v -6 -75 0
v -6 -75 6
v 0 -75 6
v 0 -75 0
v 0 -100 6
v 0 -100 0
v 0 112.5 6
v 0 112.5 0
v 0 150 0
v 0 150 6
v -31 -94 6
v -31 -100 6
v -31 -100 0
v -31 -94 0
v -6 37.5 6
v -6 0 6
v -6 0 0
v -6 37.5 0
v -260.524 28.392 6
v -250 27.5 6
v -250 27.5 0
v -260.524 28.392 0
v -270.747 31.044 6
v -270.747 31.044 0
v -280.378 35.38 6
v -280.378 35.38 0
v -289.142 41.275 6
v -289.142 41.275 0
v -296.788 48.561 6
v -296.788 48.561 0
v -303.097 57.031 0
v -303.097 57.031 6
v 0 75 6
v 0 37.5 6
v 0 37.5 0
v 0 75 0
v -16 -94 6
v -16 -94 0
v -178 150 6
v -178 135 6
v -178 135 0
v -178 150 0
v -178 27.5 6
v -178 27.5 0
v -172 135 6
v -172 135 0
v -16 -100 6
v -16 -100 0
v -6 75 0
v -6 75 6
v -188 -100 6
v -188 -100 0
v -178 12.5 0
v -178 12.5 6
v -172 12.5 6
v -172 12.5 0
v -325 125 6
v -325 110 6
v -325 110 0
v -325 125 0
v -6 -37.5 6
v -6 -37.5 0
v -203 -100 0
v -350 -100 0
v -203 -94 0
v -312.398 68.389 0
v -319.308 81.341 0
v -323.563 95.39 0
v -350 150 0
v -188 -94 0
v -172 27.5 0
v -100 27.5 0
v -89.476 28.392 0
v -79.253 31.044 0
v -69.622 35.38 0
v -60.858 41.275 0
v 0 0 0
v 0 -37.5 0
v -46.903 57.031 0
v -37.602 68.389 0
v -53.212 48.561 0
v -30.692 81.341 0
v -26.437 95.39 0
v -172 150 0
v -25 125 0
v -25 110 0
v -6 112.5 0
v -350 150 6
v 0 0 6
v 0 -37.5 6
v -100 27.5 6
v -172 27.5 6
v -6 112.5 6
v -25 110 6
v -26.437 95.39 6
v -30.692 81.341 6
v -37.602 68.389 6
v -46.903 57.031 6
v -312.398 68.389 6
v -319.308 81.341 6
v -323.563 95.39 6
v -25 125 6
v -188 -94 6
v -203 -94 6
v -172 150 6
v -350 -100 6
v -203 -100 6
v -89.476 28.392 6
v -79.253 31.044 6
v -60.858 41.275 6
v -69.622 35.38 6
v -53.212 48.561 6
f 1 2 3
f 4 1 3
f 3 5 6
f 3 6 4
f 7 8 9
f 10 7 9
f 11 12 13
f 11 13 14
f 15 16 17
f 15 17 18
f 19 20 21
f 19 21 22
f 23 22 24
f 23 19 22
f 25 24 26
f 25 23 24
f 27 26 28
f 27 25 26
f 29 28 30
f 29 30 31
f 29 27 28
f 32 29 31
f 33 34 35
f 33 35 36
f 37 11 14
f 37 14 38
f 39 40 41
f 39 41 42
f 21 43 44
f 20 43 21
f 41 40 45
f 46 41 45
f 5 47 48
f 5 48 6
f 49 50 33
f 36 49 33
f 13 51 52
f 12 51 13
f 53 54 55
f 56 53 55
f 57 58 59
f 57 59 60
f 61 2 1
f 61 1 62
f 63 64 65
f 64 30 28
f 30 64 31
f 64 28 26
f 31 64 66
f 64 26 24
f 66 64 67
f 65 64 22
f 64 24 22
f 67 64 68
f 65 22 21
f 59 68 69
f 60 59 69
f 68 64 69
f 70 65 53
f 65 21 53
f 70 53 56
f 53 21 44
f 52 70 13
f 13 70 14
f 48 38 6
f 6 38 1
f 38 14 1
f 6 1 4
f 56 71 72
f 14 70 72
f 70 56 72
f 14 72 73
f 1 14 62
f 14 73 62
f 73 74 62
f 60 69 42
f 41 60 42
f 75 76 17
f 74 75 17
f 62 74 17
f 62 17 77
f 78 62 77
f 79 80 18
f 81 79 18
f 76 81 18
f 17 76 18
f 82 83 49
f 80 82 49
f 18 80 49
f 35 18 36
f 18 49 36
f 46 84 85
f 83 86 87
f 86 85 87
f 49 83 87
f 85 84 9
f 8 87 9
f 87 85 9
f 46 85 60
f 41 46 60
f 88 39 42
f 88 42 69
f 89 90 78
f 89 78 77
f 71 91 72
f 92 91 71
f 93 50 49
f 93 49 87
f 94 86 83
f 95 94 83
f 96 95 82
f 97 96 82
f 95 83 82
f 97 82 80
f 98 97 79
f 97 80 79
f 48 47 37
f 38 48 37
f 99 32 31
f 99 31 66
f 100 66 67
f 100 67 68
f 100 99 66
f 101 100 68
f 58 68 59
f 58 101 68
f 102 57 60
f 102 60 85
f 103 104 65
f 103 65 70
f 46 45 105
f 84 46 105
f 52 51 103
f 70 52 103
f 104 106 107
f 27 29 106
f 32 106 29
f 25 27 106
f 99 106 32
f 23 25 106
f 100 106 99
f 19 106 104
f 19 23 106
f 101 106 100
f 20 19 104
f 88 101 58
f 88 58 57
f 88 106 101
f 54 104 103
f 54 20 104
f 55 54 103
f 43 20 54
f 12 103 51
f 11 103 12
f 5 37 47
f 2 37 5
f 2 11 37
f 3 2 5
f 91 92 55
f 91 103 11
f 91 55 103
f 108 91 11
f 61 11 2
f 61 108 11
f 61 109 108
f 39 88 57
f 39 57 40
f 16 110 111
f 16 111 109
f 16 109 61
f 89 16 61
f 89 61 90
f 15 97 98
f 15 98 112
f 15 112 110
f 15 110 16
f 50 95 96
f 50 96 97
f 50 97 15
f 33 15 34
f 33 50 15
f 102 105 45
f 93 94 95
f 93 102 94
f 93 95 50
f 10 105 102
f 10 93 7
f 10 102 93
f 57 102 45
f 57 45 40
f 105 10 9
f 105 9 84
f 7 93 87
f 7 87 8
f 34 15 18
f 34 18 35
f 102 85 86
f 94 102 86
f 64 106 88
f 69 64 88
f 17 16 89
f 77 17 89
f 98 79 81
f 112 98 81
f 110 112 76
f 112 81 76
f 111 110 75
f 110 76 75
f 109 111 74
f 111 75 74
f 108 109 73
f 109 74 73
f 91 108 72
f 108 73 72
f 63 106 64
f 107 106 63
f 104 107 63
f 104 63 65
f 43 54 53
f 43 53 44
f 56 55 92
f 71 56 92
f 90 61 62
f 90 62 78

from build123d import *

# Parameters (mm, degrees)
SKETCH1_W           = 200
SKETCH1_H           = 150
BOSS_EXTRUDE1_DEPTH = 6
SKETCH3_W           = 100
SKETCH3_H           = 97.5
CUT_EXTRUDE1_DEPTH  = 6
BOSS_EXTRUDE3_DEPTH = 6
SKETCH5_W           = 6
SKETCH5_H           = 15
CUT_EXTRUDE2_DEPTH  = 6
SKETCH6_W           = 6
SKETCH6_H           = 37.5
CUT_EXTRUDE3_DEPTH  = 6
SKETCH8_W           = 350
SKETCH8_H           = 100
BOSS_EXTRUDE4_DEPTH = 6
LPATTERN1_COUNT     = 3
LPATTERN1_PITCH     = 75
SKETCH7_W           = 15
SKETCH7_H           = 6
CUT_EXTRUDE_S_DEPTH = 381.835922675


with BuildPart() as part:
    # Sketch1 → Boss-Extrude1 (new body)
    with BuildSketch(Plane.XY):
        with Locations((-100, 75)):
            Rectangle(SKETCH1_W, SKETCH1_H)
        with BuildLine():
            Line((-175, 110), (-175, 125))
            Line((-175, 125), (-25, 125))
            Line((-25, 125), (-25, 110))
            ThreePointArc((-25, 110), (-30.691670032, 81.340701386), (-46.902810588, 57.03125))
            ThreePointArc((-46.902810588, 57.03125), (-100, 27.5), (-153.097189412, 57.03125))
            ThreePointArc((-153.097189412, 57.03125), (-169.308329968, 81.340701386), (-175, 110))
        make_face(mode=Mode.SUBTRACT)
    extrude(amount=BOSS_EXTRUDE1_DEPTH)

    # Sketch3 → Cut-Extrude1 (cut)
    with BuildSketch(Plane.XY.offset(6)):
        with Locations((-150, 76.25)):
            Rectangle(SKETCH3_W, SKETCH3_H)
    extrude(amount=-CUT_EXTRUDE1_DEPTH, mode=Mode.SUBTRACT)

    # Sketch4 → Boss-Extrude3 (add)
    with BuildSketch(Plane.XY.offset(6)):
        with BuildLine():
            Line((-200, 27.5), (-250, 27.5))
            ThreePointArc((-250, 27.5), (-280.378472024, 35.379505335), (-303.097189412, 57.03125))
            ThreePointArc((-303.097189412, 57.03125), (-319.308329968, 81.340701386), (-325, 110))
            Line((-325, 110), (-325, 125))
            Line((-325, 125), (-200, 125))
            Line((-200, 125), (-200, 150))
            Line((-200, 150), (-350, 150))
            Line((-350, 150), (-350, 0))
            Line((-350, 0), (-200, 0))
            Line((-200, 0), (-200, 27.5))
        make_face()
    extrude(amount=-BOSS_EXTRUDE3_DEPTH)

    # Sketch5 → Cut-Extrude2 (cut)
    with BuildSketch(Plane.XY.offset(6)):
        with Locations((-175, 142.5)):
            Rectangle(SKETCH5_W, SKETCH5_H)
        with Locations((-175, 20)):
            Rectangle(SKETCH5_W, SKETCH5_H)
    extrude(amount=-CUT_EXTRUDE2_DEPTH, mode=Mode.SUBTRACT)

    # Sketch6 → Cut-Extrude3 (cut)
    with BuildSketch(Plane.XY.offset(6)):
        with Locations((-3, 93.75)):
            Rectangle(SKETCH6_W, SKETCH6_H)
    cut_extrude3 = extrude(amount=-CUT_EXTRUDE3_DEPTH, mode=Mode.SUBTRACT)

    # Sketch8 → Boss-Extrude4 (add)
    with BuildSketch(Plane.XY.offset(6)):
        with Locations((-175, -50)):
            Rectangle(SKETCH8_W, SKETCH8_H)
    extrude(amount=-BOSS_EXTRUDE4_DEPTH)

    # LPattern1: Cut-Extrude3 ×3
    with Locations(*[(0, -i * LPATTERN1_PITCH, 0) for i in range(1, LPATTERN1_COUNT)]):
        add(cut_extrude3, mode=Mode.SUBTRACT)

    # Sketch7 → Cut-Extrude s (cut, through all)
    with BuildSketch(Plane.XY.offset(6)):
        with Locations((-23.5, -97)):
            Rectangle(SKETCH7_W, SKETCH7_H)
        with Locations((-195.5, -97)):
            Rectangle(SKETCH7_W, SKETCH7_H)
    extrude(amount=-CUT_EXTRUDE_S_DEPTH, mode=Mode.SUBTRACT)


solid = part.part
